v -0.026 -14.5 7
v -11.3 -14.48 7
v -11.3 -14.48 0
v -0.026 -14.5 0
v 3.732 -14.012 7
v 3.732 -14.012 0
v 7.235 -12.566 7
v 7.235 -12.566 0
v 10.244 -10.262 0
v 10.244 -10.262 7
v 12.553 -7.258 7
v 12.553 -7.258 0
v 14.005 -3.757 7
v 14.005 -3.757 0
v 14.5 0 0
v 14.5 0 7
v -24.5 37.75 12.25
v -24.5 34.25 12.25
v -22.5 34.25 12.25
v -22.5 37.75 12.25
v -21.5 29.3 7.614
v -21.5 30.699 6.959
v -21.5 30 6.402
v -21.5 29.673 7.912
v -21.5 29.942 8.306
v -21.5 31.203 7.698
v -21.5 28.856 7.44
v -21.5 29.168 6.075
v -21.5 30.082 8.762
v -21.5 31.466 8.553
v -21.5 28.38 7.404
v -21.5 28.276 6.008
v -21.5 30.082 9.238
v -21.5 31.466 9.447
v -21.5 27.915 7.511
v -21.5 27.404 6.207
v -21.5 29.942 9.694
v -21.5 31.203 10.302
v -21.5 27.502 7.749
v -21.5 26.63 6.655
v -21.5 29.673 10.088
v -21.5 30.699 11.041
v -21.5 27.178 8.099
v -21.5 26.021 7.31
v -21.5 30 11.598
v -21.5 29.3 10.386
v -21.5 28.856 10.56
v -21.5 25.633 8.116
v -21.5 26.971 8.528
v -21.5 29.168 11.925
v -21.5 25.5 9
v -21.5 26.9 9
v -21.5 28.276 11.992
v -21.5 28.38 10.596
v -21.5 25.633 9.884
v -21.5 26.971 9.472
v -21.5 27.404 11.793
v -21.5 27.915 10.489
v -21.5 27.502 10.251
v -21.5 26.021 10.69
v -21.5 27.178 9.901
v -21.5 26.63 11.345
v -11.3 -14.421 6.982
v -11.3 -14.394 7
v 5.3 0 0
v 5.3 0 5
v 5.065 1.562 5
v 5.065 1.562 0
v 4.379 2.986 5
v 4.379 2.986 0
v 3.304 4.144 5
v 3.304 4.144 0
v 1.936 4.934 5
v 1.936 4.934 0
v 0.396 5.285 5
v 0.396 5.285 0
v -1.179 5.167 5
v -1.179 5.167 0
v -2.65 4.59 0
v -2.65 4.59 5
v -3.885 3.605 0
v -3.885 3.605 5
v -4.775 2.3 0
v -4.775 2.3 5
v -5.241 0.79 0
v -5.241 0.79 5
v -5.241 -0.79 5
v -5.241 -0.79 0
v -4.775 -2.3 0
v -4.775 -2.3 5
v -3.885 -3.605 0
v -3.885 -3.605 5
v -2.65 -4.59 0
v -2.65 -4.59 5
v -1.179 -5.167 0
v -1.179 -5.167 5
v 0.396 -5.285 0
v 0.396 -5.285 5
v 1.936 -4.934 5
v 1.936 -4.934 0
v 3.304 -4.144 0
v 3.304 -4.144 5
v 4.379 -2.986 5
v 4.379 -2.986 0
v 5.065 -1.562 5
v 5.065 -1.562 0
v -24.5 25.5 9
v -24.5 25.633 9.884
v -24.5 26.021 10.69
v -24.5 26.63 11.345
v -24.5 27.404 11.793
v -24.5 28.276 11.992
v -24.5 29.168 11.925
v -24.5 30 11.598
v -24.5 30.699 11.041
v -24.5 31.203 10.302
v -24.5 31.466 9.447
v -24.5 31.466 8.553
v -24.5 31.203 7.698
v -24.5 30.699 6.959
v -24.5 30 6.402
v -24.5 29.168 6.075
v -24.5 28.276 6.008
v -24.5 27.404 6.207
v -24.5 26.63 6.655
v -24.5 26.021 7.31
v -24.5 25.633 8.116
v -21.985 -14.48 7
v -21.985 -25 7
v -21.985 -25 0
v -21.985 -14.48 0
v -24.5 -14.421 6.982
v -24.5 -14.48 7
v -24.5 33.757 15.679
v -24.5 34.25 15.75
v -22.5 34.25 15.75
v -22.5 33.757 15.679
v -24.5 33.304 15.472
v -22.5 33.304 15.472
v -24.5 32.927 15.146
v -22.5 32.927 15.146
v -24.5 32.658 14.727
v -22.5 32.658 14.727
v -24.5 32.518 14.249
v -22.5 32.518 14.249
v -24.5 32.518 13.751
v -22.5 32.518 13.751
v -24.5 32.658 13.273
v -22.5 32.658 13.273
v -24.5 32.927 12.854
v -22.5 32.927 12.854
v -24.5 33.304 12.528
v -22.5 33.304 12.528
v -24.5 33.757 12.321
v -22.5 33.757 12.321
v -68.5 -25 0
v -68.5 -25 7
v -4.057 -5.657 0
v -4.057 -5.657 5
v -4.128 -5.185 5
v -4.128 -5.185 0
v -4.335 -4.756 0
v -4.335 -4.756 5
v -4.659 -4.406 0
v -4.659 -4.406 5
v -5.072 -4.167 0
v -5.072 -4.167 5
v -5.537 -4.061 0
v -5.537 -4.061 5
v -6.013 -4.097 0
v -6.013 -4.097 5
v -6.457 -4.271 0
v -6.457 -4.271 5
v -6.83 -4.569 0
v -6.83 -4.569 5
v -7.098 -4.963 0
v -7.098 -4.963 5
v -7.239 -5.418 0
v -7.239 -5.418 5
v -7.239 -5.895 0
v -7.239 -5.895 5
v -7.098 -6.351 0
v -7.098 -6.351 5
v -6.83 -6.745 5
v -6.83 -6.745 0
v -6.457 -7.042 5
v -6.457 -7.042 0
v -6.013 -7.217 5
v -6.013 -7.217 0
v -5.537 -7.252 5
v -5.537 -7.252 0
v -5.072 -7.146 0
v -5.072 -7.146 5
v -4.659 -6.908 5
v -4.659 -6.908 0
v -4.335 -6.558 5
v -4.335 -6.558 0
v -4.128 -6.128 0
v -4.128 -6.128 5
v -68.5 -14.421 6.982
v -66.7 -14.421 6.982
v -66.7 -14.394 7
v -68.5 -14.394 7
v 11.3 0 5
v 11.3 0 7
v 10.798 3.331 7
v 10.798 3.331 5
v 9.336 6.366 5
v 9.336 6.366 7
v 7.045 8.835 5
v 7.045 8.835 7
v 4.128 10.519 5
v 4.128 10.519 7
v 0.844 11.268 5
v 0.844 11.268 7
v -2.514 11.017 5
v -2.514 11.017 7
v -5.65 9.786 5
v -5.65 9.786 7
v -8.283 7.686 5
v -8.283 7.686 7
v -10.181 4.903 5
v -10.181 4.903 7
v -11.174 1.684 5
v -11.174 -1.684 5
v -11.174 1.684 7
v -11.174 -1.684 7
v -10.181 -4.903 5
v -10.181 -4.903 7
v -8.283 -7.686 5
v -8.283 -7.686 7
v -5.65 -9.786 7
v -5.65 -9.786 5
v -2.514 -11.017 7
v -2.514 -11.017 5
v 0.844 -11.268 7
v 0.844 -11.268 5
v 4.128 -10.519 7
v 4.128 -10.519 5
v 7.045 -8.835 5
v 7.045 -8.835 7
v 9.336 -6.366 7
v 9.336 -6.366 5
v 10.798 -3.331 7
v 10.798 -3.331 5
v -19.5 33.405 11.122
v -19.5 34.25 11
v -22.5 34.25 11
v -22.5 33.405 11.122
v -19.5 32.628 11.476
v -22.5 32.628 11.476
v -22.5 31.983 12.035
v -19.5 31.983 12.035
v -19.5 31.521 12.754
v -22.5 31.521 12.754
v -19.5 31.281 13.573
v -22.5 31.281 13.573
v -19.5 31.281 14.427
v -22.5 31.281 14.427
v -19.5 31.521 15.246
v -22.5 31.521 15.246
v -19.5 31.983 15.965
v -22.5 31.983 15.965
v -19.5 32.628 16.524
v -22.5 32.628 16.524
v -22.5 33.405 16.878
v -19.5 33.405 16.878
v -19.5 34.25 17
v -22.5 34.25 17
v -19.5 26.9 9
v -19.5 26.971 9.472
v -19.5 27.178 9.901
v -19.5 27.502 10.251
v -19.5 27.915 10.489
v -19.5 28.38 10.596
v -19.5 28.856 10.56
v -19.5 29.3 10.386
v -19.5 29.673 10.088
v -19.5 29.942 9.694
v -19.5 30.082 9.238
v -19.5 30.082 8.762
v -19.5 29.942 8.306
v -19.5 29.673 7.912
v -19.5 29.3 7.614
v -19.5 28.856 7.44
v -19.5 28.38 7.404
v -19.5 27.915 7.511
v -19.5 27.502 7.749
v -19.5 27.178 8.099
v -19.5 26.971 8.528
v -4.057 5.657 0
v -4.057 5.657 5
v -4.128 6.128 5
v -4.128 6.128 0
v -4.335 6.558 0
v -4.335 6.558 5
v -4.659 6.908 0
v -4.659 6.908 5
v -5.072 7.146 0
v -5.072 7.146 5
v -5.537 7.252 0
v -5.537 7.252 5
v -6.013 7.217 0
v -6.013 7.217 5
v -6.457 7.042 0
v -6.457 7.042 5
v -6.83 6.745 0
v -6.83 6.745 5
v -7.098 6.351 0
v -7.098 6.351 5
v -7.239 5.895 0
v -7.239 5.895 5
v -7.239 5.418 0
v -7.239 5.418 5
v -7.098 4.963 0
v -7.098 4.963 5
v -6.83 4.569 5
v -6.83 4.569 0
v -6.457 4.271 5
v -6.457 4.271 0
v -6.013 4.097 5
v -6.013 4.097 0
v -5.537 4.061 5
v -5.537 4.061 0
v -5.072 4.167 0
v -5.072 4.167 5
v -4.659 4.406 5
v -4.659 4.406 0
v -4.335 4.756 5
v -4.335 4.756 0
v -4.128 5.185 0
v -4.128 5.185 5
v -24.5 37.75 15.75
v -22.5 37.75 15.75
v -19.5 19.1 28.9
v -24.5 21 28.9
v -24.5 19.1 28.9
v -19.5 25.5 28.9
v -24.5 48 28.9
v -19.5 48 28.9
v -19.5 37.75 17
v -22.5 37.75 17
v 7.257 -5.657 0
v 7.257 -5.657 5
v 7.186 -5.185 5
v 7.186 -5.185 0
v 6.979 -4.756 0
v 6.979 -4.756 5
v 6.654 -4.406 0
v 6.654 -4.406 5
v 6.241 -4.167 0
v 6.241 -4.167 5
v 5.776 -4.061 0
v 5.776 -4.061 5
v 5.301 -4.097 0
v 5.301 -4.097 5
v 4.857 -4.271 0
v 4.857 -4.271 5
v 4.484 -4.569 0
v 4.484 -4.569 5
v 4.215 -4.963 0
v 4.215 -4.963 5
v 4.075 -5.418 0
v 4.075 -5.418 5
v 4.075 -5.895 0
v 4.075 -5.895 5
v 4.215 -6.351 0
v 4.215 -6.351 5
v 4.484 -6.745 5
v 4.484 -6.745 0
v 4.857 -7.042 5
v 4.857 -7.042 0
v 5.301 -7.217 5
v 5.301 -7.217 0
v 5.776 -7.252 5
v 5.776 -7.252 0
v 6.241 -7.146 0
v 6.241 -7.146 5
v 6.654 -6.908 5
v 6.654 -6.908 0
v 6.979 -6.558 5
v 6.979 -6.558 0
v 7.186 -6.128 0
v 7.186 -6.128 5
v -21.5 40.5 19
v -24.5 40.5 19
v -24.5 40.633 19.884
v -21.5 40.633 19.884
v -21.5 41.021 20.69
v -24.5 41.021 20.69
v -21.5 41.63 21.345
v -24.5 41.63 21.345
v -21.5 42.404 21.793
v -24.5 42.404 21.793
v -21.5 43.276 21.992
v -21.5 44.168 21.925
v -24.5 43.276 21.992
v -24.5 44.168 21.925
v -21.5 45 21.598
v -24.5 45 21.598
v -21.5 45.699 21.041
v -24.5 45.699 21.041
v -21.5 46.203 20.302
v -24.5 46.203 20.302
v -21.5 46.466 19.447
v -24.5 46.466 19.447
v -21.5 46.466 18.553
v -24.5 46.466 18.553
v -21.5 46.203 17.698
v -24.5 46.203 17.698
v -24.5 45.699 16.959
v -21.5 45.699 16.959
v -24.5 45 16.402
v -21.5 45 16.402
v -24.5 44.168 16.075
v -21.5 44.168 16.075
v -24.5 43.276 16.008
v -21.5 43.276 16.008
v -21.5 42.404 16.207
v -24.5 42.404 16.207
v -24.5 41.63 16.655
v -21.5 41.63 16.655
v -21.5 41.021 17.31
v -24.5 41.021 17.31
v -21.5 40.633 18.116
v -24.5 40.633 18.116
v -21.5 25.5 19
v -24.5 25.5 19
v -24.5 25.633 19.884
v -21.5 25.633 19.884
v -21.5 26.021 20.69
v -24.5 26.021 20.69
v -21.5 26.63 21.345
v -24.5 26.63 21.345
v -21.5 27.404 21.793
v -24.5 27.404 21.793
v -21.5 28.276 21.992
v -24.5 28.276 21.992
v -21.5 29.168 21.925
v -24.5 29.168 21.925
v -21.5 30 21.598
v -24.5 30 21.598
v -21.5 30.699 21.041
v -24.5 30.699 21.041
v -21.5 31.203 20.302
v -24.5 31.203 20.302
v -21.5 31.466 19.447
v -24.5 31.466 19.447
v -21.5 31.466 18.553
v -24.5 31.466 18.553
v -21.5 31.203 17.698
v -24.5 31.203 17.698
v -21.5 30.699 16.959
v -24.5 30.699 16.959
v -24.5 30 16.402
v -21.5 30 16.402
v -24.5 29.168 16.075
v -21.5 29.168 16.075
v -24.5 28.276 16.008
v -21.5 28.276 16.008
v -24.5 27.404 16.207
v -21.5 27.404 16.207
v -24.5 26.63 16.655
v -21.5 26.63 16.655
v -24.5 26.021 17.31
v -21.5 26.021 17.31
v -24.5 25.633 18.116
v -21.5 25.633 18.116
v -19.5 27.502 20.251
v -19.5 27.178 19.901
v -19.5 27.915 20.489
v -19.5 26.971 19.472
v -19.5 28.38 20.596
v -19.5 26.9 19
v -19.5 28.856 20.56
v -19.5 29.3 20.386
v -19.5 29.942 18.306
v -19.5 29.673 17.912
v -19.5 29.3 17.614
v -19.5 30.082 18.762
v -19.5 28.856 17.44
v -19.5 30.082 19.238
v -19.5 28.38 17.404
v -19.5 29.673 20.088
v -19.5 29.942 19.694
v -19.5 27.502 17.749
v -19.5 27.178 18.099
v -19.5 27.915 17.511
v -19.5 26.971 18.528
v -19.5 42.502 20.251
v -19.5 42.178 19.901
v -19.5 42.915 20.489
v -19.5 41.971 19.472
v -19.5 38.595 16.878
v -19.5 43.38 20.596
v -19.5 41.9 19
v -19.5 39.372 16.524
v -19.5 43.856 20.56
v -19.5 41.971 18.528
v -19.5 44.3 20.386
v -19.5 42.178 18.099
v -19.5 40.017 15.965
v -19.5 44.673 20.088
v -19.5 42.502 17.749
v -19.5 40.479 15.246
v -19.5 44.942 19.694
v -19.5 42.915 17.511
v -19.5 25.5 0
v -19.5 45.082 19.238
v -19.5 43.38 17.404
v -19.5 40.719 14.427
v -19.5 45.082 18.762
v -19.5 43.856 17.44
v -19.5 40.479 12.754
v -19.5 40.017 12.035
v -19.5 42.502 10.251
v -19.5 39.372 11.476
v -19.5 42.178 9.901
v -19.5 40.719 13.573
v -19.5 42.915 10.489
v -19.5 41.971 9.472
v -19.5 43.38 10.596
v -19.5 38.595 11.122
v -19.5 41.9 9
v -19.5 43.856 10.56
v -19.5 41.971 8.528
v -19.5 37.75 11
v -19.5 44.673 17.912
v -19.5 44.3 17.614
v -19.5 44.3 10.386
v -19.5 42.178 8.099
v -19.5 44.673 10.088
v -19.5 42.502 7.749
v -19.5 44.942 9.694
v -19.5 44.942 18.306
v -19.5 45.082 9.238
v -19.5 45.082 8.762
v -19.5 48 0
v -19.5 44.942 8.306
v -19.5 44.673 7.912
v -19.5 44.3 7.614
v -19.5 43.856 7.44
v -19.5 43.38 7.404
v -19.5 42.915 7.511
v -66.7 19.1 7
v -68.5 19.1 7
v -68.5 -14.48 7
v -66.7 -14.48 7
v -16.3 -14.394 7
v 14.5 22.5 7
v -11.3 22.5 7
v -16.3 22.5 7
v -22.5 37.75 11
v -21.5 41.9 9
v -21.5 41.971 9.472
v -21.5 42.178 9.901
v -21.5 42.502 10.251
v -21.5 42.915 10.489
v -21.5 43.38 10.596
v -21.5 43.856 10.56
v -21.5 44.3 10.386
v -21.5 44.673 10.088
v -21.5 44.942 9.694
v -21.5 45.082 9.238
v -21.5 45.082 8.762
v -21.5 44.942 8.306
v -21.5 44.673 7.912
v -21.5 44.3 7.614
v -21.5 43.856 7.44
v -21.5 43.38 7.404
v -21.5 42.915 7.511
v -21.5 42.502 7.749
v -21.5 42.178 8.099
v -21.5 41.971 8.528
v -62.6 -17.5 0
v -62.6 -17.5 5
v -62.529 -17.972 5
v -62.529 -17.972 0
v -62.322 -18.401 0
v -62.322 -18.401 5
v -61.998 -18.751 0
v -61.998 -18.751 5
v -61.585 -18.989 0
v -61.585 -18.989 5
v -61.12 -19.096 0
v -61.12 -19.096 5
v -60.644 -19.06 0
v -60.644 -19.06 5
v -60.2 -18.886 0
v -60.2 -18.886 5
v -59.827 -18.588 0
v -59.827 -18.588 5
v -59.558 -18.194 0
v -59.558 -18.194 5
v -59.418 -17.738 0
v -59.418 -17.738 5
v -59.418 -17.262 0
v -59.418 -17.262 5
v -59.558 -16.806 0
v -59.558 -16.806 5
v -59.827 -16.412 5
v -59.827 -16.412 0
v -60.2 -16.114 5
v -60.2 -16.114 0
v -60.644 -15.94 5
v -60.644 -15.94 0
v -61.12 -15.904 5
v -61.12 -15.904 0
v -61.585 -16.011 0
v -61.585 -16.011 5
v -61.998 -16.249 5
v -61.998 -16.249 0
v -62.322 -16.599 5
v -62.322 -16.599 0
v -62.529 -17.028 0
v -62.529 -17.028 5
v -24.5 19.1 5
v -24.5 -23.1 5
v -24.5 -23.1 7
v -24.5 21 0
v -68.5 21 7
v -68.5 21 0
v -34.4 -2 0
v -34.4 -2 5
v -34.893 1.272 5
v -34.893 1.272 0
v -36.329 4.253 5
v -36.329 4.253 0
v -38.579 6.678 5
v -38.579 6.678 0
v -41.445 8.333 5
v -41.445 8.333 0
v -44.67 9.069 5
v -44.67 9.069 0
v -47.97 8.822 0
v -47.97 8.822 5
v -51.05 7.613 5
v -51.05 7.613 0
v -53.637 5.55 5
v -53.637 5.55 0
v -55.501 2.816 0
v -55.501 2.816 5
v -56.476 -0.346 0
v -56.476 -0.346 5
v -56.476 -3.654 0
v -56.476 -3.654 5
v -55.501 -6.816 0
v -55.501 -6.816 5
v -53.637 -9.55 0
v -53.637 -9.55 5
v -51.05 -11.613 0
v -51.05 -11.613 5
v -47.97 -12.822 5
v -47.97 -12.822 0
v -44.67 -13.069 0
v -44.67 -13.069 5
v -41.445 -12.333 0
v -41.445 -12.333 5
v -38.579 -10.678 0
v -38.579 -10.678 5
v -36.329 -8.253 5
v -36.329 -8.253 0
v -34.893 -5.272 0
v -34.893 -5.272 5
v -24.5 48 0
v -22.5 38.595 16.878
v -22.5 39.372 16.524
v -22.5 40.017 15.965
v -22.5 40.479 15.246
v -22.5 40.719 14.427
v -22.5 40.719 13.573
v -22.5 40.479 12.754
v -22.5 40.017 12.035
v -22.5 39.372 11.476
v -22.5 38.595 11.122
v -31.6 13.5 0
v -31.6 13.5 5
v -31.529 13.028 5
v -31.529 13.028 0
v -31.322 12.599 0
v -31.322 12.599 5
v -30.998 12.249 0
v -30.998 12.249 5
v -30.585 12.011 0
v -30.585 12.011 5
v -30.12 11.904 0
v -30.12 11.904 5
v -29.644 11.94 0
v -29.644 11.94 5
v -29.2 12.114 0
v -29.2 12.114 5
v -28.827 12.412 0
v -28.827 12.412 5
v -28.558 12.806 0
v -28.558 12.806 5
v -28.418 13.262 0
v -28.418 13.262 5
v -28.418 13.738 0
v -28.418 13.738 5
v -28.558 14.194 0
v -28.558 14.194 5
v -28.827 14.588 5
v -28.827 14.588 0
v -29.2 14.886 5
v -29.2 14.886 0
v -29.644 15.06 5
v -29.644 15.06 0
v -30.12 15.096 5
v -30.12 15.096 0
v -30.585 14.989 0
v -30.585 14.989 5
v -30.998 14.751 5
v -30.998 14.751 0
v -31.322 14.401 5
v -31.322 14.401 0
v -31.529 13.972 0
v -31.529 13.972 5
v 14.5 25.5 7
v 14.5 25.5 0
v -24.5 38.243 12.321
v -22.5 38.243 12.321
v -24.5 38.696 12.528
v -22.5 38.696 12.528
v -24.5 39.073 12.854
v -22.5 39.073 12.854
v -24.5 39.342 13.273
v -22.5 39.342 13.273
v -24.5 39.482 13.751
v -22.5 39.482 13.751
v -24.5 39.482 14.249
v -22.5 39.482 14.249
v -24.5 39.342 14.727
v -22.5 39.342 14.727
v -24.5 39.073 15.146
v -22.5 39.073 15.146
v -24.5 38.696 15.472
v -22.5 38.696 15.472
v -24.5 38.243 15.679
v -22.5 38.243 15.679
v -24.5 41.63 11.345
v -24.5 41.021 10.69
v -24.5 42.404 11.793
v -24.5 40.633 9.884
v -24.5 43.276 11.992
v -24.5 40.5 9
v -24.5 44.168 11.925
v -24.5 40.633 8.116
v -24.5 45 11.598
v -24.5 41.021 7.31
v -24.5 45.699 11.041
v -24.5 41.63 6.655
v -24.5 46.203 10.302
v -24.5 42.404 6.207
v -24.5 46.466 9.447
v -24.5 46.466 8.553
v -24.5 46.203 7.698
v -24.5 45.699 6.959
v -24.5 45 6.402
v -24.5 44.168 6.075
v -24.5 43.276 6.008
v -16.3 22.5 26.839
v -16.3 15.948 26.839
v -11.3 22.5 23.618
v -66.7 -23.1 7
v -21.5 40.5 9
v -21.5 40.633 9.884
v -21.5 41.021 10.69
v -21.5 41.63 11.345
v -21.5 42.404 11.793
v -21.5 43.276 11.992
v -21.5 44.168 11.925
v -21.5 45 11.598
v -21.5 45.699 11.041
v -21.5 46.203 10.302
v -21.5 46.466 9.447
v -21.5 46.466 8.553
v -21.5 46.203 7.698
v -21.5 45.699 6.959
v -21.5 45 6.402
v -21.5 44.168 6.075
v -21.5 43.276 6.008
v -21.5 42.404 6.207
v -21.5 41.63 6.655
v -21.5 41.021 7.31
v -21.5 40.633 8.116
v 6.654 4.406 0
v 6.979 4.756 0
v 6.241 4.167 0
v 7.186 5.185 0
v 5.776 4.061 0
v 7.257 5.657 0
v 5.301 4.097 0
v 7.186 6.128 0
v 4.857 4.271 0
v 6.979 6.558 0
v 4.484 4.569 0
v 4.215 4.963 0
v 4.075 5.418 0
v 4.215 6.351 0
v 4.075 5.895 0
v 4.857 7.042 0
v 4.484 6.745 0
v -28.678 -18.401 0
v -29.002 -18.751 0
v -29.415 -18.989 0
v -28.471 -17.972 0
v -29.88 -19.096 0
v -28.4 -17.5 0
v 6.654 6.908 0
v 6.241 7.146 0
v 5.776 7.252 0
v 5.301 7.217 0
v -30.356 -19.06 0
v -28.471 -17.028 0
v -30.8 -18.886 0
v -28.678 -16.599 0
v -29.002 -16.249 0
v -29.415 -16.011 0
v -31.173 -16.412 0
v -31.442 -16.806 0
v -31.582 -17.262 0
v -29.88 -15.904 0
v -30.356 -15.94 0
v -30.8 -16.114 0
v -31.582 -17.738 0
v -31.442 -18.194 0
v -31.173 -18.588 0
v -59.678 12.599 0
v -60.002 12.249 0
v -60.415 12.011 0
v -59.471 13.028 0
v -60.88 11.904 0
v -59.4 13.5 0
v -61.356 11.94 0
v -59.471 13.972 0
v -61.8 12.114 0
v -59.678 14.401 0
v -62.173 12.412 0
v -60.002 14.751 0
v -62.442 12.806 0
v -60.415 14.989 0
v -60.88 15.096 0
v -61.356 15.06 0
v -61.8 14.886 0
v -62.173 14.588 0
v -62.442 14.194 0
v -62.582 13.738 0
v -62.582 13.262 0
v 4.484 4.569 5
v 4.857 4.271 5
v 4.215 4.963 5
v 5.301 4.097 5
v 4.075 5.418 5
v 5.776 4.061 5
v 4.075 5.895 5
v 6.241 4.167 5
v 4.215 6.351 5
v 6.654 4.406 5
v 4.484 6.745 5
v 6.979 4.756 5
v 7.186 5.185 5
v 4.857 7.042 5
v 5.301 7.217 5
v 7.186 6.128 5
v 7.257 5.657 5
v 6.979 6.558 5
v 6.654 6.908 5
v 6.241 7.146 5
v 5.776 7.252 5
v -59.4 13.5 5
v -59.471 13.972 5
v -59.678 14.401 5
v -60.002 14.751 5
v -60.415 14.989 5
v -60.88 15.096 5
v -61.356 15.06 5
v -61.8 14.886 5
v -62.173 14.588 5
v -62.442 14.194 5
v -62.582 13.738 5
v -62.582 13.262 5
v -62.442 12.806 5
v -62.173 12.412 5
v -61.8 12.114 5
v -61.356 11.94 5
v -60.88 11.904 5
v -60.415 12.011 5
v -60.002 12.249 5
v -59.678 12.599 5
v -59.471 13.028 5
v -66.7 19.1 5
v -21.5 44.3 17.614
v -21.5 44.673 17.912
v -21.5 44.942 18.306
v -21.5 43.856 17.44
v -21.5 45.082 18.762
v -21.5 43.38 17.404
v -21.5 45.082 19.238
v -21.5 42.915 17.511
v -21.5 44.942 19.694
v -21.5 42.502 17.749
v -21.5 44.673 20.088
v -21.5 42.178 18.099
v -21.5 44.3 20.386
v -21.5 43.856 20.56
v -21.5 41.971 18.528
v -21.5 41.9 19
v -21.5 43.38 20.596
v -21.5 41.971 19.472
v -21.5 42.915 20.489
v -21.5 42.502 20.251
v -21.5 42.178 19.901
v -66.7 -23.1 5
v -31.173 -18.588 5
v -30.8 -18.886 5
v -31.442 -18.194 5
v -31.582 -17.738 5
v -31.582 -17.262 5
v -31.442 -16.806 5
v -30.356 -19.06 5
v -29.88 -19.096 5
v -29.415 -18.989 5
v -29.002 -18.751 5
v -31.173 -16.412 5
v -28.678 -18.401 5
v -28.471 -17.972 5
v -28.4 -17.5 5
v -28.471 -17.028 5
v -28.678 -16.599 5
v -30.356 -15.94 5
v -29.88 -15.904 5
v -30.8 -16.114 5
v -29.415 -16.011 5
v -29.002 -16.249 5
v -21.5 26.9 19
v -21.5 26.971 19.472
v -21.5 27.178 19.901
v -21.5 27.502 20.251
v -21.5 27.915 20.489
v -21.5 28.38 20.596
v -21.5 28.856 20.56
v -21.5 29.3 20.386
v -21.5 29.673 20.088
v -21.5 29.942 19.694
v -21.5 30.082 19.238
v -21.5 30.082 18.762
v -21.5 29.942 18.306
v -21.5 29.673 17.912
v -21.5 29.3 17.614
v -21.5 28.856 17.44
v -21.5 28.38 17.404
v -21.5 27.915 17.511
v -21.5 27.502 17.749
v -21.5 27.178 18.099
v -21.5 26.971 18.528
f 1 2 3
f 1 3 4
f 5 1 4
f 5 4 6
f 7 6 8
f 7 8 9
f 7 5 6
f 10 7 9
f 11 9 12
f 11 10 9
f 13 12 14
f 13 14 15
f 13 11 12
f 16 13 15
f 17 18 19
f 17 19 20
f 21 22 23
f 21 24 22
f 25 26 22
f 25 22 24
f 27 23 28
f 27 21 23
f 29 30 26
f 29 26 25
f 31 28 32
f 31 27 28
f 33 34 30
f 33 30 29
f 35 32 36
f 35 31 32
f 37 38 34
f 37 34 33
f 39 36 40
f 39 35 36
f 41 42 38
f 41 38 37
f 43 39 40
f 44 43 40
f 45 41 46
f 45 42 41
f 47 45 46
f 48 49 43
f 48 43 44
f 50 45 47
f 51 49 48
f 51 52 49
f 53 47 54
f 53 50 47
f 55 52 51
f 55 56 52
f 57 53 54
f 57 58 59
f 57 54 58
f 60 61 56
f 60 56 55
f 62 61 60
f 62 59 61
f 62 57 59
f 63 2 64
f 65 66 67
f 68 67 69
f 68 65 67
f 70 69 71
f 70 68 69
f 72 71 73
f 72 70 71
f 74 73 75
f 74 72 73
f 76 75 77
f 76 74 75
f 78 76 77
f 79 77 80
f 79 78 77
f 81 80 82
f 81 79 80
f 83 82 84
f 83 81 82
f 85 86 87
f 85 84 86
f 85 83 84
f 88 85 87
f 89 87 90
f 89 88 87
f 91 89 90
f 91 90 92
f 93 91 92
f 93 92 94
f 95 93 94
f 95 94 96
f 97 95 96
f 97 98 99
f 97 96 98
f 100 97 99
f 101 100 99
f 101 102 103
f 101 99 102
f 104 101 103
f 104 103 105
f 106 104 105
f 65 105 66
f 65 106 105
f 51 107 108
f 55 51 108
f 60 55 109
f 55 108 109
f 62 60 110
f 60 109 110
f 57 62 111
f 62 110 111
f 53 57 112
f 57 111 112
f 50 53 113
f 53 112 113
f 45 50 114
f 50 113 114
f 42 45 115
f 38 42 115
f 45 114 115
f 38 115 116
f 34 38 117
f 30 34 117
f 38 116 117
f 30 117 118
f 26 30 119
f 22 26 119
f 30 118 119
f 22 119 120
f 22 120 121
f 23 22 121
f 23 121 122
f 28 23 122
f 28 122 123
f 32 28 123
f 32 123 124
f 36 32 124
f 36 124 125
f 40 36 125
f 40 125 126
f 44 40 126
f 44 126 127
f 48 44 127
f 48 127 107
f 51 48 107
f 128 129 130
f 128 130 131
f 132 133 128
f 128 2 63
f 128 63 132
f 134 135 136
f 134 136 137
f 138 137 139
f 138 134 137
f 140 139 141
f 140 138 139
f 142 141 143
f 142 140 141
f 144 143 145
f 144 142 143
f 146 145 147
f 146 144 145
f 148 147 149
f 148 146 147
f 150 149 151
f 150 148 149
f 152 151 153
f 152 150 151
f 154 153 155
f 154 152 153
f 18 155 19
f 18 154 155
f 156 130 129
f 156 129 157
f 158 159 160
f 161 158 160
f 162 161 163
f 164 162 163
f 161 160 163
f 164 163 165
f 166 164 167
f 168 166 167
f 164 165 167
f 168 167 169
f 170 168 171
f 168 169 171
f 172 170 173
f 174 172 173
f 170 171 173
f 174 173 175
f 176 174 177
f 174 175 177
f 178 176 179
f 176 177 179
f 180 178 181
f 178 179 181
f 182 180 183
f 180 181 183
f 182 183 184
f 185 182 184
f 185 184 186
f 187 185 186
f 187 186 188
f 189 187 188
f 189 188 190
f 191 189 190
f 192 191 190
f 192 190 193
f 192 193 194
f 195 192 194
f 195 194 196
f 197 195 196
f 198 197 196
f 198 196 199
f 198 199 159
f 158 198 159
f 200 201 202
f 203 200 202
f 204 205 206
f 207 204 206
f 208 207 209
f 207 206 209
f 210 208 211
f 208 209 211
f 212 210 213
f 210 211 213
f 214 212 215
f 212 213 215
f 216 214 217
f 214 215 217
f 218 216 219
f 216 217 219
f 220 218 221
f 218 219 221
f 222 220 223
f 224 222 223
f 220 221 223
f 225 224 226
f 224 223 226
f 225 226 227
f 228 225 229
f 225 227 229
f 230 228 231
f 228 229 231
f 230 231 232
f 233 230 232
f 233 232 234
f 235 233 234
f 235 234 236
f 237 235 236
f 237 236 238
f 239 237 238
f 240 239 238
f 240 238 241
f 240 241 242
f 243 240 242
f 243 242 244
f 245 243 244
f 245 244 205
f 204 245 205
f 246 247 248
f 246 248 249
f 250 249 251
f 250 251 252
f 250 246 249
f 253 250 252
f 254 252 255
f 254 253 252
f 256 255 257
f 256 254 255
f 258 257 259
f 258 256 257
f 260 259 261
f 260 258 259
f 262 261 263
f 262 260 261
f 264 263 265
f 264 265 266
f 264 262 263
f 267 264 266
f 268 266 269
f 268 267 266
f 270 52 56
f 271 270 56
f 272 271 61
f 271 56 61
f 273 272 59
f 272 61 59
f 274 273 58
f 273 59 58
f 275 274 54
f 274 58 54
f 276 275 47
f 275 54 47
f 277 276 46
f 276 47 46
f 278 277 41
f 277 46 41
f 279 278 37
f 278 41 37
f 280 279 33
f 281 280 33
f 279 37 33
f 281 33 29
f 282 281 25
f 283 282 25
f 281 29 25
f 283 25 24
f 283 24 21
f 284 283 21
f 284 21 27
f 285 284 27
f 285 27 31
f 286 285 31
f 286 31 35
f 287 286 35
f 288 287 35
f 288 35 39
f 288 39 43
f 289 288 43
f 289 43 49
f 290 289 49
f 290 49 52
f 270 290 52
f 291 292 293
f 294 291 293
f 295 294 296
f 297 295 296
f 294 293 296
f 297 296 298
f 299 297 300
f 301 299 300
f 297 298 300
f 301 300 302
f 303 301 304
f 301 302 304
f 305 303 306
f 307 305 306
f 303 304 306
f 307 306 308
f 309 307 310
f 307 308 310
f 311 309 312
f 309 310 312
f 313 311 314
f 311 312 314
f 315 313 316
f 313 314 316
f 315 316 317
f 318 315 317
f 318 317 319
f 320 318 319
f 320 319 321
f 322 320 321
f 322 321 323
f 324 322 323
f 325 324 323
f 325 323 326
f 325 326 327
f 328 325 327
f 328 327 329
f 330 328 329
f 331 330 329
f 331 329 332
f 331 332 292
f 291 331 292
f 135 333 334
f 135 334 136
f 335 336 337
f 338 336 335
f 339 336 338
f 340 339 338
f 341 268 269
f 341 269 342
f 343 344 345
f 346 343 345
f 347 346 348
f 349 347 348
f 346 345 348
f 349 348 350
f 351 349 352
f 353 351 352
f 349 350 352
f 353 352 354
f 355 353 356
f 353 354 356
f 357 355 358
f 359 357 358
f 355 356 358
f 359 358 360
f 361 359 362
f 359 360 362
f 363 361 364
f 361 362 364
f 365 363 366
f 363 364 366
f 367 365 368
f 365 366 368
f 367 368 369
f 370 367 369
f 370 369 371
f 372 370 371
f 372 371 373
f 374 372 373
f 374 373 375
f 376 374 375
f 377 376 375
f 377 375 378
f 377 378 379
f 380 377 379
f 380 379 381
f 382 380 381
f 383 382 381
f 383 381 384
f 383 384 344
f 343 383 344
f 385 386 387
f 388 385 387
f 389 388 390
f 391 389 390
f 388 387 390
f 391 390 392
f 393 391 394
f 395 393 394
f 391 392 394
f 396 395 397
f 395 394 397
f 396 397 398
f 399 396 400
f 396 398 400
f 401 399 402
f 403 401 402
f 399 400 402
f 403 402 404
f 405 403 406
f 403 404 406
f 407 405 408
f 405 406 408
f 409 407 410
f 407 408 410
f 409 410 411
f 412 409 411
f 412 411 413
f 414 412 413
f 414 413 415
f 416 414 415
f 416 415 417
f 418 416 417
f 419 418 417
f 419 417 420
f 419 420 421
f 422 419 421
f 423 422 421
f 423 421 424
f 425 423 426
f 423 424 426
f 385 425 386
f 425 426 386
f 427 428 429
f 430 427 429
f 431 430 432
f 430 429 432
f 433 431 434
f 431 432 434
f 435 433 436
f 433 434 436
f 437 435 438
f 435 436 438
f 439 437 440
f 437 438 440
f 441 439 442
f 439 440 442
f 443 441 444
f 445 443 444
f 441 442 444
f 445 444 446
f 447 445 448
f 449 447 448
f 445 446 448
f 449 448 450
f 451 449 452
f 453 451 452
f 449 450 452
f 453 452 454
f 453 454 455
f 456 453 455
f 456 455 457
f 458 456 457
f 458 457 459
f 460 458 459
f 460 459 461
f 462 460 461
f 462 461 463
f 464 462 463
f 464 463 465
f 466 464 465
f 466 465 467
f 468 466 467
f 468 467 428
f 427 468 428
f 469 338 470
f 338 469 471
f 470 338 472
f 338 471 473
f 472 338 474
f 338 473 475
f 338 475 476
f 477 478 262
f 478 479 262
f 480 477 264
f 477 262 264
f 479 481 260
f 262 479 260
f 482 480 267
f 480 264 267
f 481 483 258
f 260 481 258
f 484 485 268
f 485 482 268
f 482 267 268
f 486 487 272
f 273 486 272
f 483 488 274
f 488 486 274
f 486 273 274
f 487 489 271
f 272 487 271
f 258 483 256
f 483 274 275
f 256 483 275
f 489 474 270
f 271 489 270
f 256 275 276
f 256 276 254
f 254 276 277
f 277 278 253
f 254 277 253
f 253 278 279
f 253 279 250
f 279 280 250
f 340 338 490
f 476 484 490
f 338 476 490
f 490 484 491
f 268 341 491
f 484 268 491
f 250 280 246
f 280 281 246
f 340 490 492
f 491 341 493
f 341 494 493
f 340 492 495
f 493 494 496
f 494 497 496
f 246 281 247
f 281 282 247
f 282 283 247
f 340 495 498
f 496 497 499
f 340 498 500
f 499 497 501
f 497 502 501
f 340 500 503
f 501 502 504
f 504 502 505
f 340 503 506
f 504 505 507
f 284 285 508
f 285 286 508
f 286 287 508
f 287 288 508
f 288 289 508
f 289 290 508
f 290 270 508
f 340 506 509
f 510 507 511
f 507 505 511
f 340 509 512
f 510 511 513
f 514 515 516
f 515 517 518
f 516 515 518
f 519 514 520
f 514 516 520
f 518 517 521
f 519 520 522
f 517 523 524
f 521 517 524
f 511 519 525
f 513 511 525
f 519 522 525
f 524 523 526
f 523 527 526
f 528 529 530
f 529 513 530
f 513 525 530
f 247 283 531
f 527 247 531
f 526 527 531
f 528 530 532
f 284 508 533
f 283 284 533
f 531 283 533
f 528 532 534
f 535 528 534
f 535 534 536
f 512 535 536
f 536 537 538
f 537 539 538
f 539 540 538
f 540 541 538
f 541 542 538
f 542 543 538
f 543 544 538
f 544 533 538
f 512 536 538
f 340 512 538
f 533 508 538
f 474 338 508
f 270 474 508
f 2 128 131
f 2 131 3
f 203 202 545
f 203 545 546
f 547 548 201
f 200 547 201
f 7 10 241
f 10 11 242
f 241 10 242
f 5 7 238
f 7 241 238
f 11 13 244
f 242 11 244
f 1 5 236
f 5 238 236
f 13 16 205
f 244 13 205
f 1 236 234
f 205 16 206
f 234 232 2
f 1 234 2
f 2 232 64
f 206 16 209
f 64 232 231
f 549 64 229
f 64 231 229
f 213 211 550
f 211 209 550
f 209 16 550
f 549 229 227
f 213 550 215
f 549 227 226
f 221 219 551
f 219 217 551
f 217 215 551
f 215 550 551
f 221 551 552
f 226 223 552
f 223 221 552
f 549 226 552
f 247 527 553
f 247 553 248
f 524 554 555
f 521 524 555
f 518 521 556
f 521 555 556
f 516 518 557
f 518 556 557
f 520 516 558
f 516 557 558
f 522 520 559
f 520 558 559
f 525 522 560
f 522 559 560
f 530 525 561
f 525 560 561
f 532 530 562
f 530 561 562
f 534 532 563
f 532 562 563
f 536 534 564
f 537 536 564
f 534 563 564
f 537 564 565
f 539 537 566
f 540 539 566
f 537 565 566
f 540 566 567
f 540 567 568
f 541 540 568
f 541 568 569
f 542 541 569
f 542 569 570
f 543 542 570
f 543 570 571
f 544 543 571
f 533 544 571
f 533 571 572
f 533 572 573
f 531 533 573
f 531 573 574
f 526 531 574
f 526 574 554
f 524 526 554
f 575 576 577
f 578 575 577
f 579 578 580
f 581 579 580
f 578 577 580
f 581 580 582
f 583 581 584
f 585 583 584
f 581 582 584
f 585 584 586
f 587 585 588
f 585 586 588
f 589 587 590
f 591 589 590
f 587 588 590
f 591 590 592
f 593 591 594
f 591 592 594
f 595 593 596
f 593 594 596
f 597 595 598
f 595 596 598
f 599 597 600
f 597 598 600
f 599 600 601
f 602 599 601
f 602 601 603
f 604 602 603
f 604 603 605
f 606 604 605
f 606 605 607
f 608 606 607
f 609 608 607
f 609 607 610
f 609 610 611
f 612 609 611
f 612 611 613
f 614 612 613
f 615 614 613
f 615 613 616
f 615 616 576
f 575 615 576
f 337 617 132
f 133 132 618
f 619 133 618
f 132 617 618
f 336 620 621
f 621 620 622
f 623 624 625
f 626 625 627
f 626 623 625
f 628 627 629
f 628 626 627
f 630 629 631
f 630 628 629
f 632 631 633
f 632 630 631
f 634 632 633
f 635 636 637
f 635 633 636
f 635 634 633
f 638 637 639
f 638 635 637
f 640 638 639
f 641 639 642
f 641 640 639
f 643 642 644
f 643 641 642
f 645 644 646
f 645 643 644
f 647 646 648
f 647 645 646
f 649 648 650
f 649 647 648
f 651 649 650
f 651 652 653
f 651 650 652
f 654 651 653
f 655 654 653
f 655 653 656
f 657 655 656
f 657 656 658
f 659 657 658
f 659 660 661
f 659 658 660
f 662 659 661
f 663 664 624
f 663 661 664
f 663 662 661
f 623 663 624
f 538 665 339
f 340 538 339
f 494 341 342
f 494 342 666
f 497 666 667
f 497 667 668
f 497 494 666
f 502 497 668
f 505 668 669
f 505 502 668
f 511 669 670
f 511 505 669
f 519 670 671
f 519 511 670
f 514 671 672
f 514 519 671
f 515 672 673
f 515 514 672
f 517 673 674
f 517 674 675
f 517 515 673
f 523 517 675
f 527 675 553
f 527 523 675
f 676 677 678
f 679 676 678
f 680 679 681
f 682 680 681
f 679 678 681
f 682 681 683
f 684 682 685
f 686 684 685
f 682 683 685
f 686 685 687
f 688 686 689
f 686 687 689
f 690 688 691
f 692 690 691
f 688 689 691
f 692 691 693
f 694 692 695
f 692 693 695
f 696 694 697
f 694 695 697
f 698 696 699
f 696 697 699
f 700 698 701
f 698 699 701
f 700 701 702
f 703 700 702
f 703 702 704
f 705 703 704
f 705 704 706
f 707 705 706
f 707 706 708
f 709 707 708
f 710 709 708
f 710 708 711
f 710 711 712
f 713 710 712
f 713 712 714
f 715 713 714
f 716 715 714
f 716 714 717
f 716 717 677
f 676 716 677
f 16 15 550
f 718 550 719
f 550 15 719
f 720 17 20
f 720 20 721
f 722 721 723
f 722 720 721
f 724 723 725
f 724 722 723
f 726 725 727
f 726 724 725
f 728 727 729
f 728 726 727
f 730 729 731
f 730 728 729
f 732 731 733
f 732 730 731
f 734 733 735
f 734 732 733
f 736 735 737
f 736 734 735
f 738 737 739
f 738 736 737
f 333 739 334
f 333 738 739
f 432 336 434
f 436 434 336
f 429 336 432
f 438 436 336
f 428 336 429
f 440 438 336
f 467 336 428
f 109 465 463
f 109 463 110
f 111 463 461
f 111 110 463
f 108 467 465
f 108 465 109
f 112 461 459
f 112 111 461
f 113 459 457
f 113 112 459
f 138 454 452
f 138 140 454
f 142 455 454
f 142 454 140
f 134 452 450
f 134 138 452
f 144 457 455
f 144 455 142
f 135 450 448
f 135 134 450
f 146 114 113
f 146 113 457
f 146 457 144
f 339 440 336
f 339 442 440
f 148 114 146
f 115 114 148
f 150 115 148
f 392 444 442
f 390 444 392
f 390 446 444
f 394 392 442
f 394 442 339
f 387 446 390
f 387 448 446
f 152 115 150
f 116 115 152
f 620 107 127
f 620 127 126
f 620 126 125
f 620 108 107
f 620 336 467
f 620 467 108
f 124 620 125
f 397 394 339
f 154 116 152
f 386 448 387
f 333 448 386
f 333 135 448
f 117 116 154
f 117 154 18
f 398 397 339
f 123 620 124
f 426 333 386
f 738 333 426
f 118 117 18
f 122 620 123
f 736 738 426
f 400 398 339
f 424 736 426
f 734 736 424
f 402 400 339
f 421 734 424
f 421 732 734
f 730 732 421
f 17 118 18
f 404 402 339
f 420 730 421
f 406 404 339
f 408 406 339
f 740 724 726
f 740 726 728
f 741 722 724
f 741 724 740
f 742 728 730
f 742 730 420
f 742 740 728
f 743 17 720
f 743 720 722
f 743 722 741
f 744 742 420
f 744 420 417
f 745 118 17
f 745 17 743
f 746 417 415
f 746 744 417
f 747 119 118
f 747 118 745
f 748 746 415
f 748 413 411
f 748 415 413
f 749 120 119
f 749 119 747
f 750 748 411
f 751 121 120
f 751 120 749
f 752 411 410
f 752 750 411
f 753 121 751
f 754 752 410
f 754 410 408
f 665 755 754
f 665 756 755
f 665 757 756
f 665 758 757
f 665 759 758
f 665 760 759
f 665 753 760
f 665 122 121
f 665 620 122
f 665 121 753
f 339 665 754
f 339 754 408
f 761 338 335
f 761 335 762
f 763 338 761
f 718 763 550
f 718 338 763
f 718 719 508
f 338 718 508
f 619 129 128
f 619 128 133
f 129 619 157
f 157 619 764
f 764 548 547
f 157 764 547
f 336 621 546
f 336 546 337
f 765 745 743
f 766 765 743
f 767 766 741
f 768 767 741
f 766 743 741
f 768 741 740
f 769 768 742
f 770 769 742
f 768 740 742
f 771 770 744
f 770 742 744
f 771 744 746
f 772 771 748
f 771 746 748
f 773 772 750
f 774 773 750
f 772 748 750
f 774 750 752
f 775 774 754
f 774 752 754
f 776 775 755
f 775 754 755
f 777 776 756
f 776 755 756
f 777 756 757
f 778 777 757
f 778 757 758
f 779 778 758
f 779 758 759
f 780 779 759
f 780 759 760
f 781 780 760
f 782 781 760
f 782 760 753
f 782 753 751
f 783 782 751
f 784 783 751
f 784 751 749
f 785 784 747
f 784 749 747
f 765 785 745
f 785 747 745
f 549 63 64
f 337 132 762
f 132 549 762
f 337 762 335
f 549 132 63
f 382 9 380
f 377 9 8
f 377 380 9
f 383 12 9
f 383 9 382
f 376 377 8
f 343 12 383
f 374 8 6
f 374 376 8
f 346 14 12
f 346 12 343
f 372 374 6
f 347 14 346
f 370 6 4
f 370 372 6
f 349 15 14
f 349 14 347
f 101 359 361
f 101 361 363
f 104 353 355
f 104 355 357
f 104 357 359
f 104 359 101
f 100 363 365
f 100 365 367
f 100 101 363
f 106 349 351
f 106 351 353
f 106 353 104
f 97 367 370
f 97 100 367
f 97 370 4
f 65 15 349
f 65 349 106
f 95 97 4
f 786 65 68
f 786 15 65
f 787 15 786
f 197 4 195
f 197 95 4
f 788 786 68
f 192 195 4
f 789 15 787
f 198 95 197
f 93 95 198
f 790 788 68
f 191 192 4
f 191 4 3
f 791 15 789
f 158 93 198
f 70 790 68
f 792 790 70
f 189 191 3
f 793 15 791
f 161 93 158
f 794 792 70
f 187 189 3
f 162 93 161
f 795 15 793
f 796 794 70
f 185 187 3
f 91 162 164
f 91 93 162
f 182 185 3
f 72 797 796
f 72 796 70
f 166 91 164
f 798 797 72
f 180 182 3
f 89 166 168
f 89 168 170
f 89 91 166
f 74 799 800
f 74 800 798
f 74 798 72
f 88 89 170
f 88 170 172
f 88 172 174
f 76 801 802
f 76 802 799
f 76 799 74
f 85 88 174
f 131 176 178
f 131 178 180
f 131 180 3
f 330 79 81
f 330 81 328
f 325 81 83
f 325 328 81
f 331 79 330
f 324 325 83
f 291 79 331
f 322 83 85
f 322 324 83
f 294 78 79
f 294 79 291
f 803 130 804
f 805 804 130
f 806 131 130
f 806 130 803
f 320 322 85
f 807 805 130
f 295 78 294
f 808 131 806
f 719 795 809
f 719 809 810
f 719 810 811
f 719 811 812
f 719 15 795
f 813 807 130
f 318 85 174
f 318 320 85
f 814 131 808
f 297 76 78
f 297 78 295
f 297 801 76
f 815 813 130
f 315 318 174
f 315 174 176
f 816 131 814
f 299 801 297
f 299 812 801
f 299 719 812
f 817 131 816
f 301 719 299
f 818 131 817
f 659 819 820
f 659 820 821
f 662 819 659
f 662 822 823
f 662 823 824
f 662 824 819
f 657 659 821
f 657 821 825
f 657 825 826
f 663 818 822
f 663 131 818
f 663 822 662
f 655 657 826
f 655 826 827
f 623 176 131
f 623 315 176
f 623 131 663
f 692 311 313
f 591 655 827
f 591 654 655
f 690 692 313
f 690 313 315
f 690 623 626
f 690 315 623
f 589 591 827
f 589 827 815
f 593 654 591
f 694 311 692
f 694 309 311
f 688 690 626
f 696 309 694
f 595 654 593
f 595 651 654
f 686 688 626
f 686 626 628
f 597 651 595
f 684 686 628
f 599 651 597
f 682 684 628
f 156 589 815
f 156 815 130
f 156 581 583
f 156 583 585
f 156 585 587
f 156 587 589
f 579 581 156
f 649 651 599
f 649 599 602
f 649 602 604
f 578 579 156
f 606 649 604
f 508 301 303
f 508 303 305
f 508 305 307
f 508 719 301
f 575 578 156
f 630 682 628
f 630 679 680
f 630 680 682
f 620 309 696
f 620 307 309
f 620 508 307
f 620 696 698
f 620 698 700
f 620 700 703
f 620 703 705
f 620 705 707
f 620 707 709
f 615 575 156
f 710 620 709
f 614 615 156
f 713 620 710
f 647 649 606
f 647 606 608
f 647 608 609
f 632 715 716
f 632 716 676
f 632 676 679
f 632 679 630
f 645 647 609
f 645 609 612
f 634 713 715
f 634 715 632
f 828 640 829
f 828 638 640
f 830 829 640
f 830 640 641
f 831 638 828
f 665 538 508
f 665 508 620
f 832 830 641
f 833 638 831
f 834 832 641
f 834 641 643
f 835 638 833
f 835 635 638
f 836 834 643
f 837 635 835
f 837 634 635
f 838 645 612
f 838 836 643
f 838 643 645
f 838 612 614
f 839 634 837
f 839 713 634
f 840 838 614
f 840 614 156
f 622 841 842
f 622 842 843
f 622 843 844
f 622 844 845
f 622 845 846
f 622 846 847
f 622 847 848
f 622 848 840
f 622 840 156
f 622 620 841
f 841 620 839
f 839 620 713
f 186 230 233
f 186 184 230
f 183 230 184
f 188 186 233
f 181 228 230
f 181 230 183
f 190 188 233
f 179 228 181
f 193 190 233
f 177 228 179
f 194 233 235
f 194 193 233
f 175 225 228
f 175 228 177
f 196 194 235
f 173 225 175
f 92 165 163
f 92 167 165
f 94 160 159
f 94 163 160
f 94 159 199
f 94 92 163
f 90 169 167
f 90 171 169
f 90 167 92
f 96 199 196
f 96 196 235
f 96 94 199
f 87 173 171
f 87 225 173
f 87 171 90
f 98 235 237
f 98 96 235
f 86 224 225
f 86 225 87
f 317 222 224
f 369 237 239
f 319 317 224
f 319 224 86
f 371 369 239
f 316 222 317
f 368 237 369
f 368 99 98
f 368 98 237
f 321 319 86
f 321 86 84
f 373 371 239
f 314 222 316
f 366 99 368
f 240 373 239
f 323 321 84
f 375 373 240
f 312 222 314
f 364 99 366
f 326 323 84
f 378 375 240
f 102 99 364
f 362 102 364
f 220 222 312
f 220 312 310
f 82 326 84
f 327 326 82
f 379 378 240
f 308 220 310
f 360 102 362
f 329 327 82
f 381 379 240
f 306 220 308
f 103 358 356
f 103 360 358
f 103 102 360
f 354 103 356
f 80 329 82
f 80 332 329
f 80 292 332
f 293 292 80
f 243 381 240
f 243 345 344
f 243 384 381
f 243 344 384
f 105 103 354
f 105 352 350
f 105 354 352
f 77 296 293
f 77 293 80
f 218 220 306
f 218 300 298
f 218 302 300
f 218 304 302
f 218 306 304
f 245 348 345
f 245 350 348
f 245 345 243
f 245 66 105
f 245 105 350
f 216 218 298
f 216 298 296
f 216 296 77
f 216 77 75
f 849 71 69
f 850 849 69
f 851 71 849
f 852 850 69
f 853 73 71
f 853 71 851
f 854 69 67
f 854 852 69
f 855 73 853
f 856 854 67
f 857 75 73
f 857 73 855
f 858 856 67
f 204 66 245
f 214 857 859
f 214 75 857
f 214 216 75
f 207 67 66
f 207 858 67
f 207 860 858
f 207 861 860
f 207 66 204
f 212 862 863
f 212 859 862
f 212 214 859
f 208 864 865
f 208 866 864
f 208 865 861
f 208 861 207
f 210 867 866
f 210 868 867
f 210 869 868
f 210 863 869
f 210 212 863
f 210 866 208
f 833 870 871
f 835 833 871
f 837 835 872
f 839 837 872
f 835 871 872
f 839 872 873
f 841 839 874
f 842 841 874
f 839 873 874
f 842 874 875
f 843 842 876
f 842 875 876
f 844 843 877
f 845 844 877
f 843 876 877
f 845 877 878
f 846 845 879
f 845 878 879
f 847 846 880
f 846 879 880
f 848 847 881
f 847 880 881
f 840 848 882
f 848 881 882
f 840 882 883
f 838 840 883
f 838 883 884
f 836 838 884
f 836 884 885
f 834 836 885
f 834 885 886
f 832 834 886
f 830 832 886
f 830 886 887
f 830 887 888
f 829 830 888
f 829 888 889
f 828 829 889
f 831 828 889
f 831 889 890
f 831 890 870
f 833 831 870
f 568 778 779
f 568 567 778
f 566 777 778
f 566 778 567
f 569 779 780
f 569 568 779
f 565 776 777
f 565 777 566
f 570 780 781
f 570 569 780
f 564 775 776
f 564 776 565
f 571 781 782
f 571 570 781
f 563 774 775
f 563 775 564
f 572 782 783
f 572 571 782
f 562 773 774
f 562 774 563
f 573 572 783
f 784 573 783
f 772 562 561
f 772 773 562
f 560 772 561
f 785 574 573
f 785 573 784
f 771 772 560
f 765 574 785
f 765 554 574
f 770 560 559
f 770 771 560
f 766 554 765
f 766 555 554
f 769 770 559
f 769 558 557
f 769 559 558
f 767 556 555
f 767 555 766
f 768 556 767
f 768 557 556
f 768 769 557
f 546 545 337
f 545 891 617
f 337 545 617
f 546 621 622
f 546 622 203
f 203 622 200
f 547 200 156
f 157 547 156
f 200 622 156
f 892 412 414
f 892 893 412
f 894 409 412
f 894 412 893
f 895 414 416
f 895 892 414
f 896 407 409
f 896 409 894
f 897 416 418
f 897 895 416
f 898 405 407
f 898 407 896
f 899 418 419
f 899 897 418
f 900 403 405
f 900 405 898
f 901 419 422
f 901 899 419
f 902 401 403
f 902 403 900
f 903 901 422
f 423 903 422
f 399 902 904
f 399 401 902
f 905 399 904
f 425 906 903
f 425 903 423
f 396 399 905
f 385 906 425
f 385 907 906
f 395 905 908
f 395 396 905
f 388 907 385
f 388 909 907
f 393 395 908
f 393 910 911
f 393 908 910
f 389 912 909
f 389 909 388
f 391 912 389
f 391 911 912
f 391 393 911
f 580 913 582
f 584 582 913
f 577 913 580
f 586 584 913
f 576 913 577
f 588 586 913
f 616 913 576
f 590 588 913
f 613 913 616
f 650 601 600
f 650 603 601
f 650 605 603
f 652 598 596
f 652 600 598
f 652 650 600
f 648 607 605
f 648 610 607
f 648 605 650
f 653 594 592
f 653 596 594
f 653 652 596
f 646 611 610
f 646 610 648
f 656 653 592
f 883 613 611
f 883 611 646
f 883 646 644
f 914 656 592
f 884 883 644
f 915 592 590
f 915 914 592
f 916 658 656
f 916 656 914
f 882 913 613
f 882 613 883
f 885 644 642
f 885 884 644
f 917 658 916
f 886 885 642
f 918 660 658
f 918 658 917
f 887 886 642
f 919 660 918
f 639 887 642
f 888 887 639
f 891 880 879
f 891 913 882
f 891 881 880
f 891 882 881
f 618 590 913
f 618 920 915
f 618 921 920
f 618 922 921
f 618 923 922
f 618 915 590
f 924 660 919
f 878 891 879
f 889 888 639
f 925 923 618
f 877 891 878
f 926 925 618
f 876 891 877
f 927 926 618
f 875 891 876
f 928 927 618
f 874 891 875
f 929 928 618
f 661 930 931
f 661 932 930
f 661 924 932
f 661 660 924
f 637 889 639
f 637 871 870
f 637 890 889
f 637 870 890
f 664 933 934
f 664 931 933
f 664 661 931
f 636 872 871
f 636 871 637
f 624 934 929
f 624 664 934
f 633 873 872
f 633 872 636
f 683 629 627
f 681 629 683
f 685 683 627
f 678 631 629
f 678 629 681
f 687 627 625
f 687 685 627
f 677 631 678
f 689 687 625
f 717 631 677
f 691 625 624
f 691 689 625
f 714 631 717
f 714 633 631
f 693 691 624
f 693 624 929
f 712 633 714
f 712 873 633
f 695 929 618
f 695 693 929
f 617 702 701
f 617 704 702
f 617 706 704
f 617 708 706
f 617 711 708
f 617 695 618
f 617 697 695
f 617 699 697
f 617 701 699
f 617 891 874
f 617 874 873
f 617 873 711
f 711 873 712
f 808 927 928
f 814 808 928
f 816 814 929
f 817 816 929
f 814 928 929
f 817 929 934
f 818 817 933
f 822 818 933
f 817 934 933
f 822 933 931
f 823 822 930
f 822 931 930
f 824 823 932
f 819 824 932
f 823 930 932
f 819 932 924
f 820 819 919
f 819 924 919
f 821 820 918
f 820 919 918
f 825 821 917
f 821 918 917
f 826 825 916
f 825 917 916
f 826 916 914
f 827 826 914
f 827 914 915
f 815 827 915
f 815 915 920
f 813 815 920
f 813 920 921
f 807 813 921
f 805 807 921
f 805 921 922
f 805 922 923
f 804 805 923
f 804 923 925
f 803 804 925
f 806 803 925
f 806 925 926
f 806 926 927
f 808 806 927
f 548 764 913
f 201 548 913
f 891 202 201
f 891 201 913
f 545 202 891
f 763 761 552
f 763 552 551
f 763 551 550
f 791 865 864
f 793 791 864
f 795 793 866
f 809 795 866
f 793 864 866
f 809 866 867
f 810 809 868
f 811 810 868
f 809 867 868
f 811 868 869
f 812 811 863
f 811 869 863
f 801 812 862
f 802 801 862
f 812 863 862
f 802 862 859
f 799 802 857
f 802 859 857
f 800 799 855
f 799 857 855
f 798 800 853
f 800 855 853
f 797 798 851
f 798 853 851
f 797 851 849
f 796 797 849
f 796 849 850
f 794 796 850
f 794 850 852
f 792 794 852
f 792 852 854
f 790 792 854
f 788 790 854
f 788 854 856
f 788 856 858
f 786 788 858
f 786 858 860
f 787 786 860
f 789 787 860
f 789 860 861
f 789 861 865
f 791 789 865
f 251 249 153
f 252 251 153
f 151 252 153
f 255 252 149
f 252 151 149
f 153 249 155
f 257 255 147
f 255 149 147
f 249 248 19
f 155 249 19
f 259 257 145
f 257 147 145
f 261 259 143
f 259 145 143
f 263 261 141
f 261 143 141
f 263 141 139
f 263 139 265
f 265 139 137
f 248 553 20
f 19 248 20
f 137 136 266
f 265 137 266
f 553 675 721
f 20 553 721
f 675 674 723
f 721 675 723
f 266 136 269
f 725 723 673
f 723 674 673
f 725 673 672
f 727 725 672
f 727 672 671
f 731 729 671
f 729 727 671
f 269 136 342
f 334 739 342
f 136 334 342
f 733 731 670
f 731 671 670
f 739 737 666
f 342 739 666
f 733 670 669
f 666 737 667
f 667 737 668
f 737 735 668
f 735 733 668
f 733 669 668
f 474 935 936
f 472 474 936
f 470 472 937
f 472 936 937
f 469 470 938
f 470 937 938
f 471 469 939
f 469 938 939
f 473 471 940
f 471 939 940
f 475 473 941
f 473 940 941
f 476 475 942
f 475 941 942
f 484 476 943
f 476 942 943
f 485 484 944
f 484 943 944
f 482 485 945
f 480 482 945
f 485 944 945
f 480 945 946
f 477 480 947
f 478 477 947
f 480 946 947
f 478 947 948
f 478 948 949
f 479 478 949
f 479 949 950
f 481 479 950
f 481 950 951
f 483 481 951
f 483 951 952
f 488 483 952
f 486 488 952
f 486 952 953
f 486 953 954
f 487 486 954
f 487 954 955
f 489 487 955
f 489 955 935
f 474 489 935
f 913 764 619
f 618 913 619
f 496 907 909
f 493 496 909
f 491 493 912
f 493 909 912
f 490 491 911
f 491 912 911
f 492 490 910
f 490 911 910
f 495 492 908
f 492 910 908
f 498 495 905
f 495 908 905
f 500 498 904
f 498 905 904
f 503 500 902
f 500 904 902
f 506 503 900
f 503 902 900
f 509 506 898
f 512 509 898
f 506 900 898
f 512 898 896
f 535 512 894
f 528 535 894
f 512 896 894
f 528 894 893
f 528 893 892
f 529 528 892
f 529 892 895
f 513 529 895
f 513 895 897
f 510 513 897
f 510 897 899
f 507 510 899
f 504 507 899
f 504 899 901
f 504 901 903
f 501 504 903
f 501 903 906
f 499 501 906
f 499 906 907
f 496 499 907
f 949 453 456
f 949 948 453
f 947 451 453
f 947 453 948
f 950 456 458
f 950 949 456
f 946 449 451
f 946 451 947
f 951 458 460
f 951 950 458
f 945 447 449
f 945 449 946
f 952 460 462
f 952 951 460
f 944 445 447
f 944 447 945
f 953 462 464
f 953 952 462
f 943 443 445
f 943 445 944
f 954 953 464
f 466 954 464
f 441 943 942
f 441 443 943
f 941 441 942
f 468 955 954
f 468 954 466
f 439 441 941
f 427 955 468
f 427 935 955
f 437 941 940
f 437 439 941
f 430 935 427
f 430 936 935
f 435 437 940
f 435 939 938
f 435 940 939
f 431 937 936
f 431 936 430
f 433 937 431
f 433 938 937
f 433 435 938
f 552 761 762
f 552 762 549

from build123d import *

# Parameters (mm, degrees)
SKETCH_1_R               = 5.3
SKETCH_1_R_2             = 11.1
EXTRUDE_1_DEPTH          = 7
SKETCH_2_R               = 11.3
SKETCH_2_W               = 42.2
SKETCH_2_H               = 42.2
CUT_EXTRUDE_1_DEPTH      = 2
SKETCH_3_R               = 1.6
CUT_EXTRUDE_2_DEPTH      = 99.783854956
EXTRUDE_2_DEPTH          = 21.9
CUT_EXTRUDE_3_DEPTH      = 96.645438992
CUT_EXTRUDE_4_DEPTH      = 89.767730623
CUT_EXTRUDE_4_DEPTH_BACK = 10
CUT_EXTRUDE_5_DEPTH      = 102.058695816
SKETCH_8_R               = 1.6
SKETCH_8_W               = 41.679602286
SKETCH_8_H               = 26.376779249
CUT_EXTRUDE_6_DEPTH      = 89.386707145
SKETCH_9_R               = 3
CUT_EXTRUDE_7_DEPTH      = 3
CUT_EXTRUDE_8_DEPTH      = 3
SKETCH_11_W              = 44
SKETCH_11_H              = 5
CUT_EXTRUDE_9_DEPTH      = 89.495536611
SKETCH_12_W              = 37.71360908
SKETCH_12_H              = 40.060480483
CUT_EXTRUDE_11_DEPTH     = 5
SKETCH_13_W              = 8.835151958
SKETCH_13_H              = 10.520362882
CUT_EXTRUDE_12_DEPTH     = 87.463055694


with BuildPart() as part:
    # 草图1 → 凸台-拉伸1 (new body)
    with BuildSketch(Plane.XY):
        Polygon((-68.5, 26), (-24.5, 26), (-24.5, 71), (-19.5, 71), (-19.5, 26), (-19.5, 25.5), (14.5, 25.5), (14.5, -25), (-68.5, -25), align=None)
        Circle(SKETCH_1_R, mode=Mode.SUBTRACT)
        with Locations((-45.5, -2)):
            Circle(SKETCH_1_R_2, mode=Mode.SUBTRACT)
    extrude(amount=EXTRUDE_1_DEPTH)

    # 草图2 → 切除-拉伸1 (cut)
    with BuildSketch(Plane.XY.offset(7)):
        Circle(SKETCH_2_R)
        with Locations((-45.6, -2)):
            Rectangle(SKETCH_2_W, SKETCH_2_H)
    extrude(amount=-CUT_EXTRUDE_1_DEPTH, mode=Mode.SUBTRACT)

    # 草图3 → 切除-拉伸2 (cut, through all)
    with BuildSketch(Plane.XY.offset(5)):
        with Locations((-61, 13.5)):
            Circle(SKETCH_3_R)
        with Locations((-30, 13.5)):
            Circle(SKETCH_3_R)
        with Locations((-30, -17.5)):
            Circle(SKETCH_3_R)
        with Locations((-61, -17.5)):
            Circle(SKETCH_3_R)
        with Locations((5.656854249, 5.656854249)):
            Circle(SKETCH_3_R)
        with Locations((-5.656854249, 5.656854249)):
            Circle(SKETCH_3_R)
        with Locations((5.656854249, -5.656854249)):
            Circle(SKETCH_3_R)
        with Locations((-5.656854249, -5.656854249)):
            Circle(SKETCH_3_R)
    extrude(amount=-CUT_EXTRUDE_2_DEPTH, mode=Mode.SUBTRACT)

    # 草图4 → 凸台-拉伸2 (add)
    with BuildSketch(Plane.XY.offset(7)):
        Polygon((-19.5, 68.4214033), (-24.5, 71), (-24.5, 26), (-68.5, 26), (-68.5, 19.1), (-66.7, 19.1), (-24.5, 19.1), (-24.5, -14.479637118), (-11.3, -14.479637118), (-11.3, 22.5), (14.5, 22.5), (14.5, 25.5), (-19.5, 25.5), align=None)
    extrude(amount=EXTRUDE_2_DEPTH)

    # 草图5 → 切除-拉伸3 (cut, through all)
    with BuildSketch(Plane(origin=(-11.3, 0, 0), x_dir=(0, 0, -1), z_dir=(1, 0, 0))):
        Polygon((-28.9, 19.1), (-28.9, -14.479637118), (-7, -14.479637118), (-6.982294127, -14.420838609), align=None)
    extrude(amount=-CUT_EXTRUDE_3_DEPTH, mode=Mode.SUBTRACT)

    # 草图6 → 切除-拉伸4 (cut, two sides: drawn at the far end of the back side and taken through both)
    with BuildSketch(Plane.XZ.offset(-22.5).offset(-CUT_EXTRUDE_4_DEPTH_BACK)):
        Polygon((-68.5, 28.9), (-68.5, 7), (-24.5, 28.9), align=None)
        Polygon((-19.5, 28.9), (14.5, 7), (14.5, 28.9), align=None)
    extrude(amount=CUT_EXTRUDE_4_DEPTH + CUT_EXTRUDE_4_DEPTH_BACK, mode=Mode.SUBTRACT)

    # 草图7 → 切除-拉伸5 (cut, through all)
    with BuildSketch(Plane.XY.offset(7)):
        with BuildLine():
            Line((-13.15, -14.479637118), (-11.3, -14.479637118))
            Line((-11.3, -14.479637118), (-0.0261596, -14.499976403))
            ThreePointArc((-0.0261596, -14.499976403), (10.243795337, -10.262292975), (14.5, 0))
            Line((14.5, 0), (21.147002499, 0))
            Line((21.147002499, 0), (22.768629324, -44.459429771))
            Line((22.768629324, -44.459429771), (-13.15, -44.459429771))
            Line((-13.15, -44.459429771), (-13.15, -14.479637118))
        make_face()
    extrude(amount=-CUT_EXTRUDE_5_DEPTH, mode=Mode.SUBTRACT)

    # 草图8 → 切除-拉伸6 (cut, through all)
    with BuildSketch(Plane.ZY.offset(24.5)):
        with Locations((19, 28.5)):
            Circle(SKETCH_8_R)
        with Locations((19, 43.5)):
            Circle(SKETCH_8_R)
        with Locations((9, 28.5)):
            Circle(SKETCH_8_R)
        with Locations((9, 43.5)):
            Circle(SKETCH_8_R)
        with Locations((14.868313548, 61.188389625)):
            Rectangle(SKETCH_8_W, SKETCH_8_H)
        with BuildLine():
            Line((15.75, 37.75), (15.75, 34.25))
            ThreePointArc((15.75, 34.25), (14, 32.5), (12.25, 34.25))
            Line((12.25, 34.25), (12.25, 37.75))
            ThreePointArc((12.25, 37.75), (14, 39.5), (15.75, 37.75))
        make_face()
    extrude(amount=-CUT_EXTRUDE_6_DEPTH, mode=Mode.SUBTRACT)

    # 草图9 → 切除-拉伸7 (cut)
    with BuildSketch(Plane.ZY.offset(24.5)):
        with Locations((9, 43.5)):
            Circle(SKETCH_9_R)
        with Locations((19, 43.5)):
            Circle(SKETCH_9_R)
        with Locations((9, 28.5)):
            Circle(SKETCH_9_R)
        with Locations((19, 28.5)):
            Circle(SKETCH_9_R)
    extrude(amount=-CUT_EXTRUDE_7_DEPTH, mode=Mode.SUBTRACT)

    # 草图10 → 切除-拉伸8 (cut)
    with BuildSketch(Plane(origin=(-19.5, 0, 0), x_dir=(0, 0, -1), z_dir=(1, 0, 0))):
        with BuildLine():
            Line((-11, 37.75), (-11, 34.25))
            ThreePointArc((-11, 34.25), (-14, 31.25), (-17, 34.25))
            Line((-17, 34.25), (-17, 37.75))
            ThreePointArc((-17, 37.75), (-14, 40.75), (-11, 37.75))
        make_face()
    extrude(amount=-CUT_EXTRUDE_8_DEPTH, mode=Mode.SUBTRACT)

    # 草图11 → 切除-拉伸9 (cut, through all)
    with BuildSketch(Plane(origin=(0, 0, 0), x_dir=(-1, 0, 0), z_dir=(0, 0, -1))):
        with Locations((46.5, 23.5)):
            Rectangle(SKETCH_11_W, SKETCH_11_H)
    extrude(amount=-CUT_EXTRUDE_9_DEPTH, mode=Mode.SUBTRACT)

    # 草图12 → 切除-拉伸11 (cut)
    with BuildSketch(Plane(origin=(-11.3, 0, 0), x_dir=(0, 0, -1), z_dir=(1, 0, 0))):
        with Locations((-25.85680454, 2.469759758)):
            Rectangle(SKETCH_12_W, SKETCH_12_H)
    extrude(amount=-CUT_EXTRUDE_11_DEPTH, mode=Mode.SUBTRACT)

    # 草图13 → 切除-拉伸12 (cut, through all)
    with BuildSketch(Plane.XY.offset(7)):
        with Locations((-17.567575979, -19.739818559)):
            Rectangle(SKETCH_13_W, SKETCH_13_H)
    extrude(amount=-CUT_EXTRUDE_12_DEPTH, mode=Mode.SUBTRACT)


solid = part.part
